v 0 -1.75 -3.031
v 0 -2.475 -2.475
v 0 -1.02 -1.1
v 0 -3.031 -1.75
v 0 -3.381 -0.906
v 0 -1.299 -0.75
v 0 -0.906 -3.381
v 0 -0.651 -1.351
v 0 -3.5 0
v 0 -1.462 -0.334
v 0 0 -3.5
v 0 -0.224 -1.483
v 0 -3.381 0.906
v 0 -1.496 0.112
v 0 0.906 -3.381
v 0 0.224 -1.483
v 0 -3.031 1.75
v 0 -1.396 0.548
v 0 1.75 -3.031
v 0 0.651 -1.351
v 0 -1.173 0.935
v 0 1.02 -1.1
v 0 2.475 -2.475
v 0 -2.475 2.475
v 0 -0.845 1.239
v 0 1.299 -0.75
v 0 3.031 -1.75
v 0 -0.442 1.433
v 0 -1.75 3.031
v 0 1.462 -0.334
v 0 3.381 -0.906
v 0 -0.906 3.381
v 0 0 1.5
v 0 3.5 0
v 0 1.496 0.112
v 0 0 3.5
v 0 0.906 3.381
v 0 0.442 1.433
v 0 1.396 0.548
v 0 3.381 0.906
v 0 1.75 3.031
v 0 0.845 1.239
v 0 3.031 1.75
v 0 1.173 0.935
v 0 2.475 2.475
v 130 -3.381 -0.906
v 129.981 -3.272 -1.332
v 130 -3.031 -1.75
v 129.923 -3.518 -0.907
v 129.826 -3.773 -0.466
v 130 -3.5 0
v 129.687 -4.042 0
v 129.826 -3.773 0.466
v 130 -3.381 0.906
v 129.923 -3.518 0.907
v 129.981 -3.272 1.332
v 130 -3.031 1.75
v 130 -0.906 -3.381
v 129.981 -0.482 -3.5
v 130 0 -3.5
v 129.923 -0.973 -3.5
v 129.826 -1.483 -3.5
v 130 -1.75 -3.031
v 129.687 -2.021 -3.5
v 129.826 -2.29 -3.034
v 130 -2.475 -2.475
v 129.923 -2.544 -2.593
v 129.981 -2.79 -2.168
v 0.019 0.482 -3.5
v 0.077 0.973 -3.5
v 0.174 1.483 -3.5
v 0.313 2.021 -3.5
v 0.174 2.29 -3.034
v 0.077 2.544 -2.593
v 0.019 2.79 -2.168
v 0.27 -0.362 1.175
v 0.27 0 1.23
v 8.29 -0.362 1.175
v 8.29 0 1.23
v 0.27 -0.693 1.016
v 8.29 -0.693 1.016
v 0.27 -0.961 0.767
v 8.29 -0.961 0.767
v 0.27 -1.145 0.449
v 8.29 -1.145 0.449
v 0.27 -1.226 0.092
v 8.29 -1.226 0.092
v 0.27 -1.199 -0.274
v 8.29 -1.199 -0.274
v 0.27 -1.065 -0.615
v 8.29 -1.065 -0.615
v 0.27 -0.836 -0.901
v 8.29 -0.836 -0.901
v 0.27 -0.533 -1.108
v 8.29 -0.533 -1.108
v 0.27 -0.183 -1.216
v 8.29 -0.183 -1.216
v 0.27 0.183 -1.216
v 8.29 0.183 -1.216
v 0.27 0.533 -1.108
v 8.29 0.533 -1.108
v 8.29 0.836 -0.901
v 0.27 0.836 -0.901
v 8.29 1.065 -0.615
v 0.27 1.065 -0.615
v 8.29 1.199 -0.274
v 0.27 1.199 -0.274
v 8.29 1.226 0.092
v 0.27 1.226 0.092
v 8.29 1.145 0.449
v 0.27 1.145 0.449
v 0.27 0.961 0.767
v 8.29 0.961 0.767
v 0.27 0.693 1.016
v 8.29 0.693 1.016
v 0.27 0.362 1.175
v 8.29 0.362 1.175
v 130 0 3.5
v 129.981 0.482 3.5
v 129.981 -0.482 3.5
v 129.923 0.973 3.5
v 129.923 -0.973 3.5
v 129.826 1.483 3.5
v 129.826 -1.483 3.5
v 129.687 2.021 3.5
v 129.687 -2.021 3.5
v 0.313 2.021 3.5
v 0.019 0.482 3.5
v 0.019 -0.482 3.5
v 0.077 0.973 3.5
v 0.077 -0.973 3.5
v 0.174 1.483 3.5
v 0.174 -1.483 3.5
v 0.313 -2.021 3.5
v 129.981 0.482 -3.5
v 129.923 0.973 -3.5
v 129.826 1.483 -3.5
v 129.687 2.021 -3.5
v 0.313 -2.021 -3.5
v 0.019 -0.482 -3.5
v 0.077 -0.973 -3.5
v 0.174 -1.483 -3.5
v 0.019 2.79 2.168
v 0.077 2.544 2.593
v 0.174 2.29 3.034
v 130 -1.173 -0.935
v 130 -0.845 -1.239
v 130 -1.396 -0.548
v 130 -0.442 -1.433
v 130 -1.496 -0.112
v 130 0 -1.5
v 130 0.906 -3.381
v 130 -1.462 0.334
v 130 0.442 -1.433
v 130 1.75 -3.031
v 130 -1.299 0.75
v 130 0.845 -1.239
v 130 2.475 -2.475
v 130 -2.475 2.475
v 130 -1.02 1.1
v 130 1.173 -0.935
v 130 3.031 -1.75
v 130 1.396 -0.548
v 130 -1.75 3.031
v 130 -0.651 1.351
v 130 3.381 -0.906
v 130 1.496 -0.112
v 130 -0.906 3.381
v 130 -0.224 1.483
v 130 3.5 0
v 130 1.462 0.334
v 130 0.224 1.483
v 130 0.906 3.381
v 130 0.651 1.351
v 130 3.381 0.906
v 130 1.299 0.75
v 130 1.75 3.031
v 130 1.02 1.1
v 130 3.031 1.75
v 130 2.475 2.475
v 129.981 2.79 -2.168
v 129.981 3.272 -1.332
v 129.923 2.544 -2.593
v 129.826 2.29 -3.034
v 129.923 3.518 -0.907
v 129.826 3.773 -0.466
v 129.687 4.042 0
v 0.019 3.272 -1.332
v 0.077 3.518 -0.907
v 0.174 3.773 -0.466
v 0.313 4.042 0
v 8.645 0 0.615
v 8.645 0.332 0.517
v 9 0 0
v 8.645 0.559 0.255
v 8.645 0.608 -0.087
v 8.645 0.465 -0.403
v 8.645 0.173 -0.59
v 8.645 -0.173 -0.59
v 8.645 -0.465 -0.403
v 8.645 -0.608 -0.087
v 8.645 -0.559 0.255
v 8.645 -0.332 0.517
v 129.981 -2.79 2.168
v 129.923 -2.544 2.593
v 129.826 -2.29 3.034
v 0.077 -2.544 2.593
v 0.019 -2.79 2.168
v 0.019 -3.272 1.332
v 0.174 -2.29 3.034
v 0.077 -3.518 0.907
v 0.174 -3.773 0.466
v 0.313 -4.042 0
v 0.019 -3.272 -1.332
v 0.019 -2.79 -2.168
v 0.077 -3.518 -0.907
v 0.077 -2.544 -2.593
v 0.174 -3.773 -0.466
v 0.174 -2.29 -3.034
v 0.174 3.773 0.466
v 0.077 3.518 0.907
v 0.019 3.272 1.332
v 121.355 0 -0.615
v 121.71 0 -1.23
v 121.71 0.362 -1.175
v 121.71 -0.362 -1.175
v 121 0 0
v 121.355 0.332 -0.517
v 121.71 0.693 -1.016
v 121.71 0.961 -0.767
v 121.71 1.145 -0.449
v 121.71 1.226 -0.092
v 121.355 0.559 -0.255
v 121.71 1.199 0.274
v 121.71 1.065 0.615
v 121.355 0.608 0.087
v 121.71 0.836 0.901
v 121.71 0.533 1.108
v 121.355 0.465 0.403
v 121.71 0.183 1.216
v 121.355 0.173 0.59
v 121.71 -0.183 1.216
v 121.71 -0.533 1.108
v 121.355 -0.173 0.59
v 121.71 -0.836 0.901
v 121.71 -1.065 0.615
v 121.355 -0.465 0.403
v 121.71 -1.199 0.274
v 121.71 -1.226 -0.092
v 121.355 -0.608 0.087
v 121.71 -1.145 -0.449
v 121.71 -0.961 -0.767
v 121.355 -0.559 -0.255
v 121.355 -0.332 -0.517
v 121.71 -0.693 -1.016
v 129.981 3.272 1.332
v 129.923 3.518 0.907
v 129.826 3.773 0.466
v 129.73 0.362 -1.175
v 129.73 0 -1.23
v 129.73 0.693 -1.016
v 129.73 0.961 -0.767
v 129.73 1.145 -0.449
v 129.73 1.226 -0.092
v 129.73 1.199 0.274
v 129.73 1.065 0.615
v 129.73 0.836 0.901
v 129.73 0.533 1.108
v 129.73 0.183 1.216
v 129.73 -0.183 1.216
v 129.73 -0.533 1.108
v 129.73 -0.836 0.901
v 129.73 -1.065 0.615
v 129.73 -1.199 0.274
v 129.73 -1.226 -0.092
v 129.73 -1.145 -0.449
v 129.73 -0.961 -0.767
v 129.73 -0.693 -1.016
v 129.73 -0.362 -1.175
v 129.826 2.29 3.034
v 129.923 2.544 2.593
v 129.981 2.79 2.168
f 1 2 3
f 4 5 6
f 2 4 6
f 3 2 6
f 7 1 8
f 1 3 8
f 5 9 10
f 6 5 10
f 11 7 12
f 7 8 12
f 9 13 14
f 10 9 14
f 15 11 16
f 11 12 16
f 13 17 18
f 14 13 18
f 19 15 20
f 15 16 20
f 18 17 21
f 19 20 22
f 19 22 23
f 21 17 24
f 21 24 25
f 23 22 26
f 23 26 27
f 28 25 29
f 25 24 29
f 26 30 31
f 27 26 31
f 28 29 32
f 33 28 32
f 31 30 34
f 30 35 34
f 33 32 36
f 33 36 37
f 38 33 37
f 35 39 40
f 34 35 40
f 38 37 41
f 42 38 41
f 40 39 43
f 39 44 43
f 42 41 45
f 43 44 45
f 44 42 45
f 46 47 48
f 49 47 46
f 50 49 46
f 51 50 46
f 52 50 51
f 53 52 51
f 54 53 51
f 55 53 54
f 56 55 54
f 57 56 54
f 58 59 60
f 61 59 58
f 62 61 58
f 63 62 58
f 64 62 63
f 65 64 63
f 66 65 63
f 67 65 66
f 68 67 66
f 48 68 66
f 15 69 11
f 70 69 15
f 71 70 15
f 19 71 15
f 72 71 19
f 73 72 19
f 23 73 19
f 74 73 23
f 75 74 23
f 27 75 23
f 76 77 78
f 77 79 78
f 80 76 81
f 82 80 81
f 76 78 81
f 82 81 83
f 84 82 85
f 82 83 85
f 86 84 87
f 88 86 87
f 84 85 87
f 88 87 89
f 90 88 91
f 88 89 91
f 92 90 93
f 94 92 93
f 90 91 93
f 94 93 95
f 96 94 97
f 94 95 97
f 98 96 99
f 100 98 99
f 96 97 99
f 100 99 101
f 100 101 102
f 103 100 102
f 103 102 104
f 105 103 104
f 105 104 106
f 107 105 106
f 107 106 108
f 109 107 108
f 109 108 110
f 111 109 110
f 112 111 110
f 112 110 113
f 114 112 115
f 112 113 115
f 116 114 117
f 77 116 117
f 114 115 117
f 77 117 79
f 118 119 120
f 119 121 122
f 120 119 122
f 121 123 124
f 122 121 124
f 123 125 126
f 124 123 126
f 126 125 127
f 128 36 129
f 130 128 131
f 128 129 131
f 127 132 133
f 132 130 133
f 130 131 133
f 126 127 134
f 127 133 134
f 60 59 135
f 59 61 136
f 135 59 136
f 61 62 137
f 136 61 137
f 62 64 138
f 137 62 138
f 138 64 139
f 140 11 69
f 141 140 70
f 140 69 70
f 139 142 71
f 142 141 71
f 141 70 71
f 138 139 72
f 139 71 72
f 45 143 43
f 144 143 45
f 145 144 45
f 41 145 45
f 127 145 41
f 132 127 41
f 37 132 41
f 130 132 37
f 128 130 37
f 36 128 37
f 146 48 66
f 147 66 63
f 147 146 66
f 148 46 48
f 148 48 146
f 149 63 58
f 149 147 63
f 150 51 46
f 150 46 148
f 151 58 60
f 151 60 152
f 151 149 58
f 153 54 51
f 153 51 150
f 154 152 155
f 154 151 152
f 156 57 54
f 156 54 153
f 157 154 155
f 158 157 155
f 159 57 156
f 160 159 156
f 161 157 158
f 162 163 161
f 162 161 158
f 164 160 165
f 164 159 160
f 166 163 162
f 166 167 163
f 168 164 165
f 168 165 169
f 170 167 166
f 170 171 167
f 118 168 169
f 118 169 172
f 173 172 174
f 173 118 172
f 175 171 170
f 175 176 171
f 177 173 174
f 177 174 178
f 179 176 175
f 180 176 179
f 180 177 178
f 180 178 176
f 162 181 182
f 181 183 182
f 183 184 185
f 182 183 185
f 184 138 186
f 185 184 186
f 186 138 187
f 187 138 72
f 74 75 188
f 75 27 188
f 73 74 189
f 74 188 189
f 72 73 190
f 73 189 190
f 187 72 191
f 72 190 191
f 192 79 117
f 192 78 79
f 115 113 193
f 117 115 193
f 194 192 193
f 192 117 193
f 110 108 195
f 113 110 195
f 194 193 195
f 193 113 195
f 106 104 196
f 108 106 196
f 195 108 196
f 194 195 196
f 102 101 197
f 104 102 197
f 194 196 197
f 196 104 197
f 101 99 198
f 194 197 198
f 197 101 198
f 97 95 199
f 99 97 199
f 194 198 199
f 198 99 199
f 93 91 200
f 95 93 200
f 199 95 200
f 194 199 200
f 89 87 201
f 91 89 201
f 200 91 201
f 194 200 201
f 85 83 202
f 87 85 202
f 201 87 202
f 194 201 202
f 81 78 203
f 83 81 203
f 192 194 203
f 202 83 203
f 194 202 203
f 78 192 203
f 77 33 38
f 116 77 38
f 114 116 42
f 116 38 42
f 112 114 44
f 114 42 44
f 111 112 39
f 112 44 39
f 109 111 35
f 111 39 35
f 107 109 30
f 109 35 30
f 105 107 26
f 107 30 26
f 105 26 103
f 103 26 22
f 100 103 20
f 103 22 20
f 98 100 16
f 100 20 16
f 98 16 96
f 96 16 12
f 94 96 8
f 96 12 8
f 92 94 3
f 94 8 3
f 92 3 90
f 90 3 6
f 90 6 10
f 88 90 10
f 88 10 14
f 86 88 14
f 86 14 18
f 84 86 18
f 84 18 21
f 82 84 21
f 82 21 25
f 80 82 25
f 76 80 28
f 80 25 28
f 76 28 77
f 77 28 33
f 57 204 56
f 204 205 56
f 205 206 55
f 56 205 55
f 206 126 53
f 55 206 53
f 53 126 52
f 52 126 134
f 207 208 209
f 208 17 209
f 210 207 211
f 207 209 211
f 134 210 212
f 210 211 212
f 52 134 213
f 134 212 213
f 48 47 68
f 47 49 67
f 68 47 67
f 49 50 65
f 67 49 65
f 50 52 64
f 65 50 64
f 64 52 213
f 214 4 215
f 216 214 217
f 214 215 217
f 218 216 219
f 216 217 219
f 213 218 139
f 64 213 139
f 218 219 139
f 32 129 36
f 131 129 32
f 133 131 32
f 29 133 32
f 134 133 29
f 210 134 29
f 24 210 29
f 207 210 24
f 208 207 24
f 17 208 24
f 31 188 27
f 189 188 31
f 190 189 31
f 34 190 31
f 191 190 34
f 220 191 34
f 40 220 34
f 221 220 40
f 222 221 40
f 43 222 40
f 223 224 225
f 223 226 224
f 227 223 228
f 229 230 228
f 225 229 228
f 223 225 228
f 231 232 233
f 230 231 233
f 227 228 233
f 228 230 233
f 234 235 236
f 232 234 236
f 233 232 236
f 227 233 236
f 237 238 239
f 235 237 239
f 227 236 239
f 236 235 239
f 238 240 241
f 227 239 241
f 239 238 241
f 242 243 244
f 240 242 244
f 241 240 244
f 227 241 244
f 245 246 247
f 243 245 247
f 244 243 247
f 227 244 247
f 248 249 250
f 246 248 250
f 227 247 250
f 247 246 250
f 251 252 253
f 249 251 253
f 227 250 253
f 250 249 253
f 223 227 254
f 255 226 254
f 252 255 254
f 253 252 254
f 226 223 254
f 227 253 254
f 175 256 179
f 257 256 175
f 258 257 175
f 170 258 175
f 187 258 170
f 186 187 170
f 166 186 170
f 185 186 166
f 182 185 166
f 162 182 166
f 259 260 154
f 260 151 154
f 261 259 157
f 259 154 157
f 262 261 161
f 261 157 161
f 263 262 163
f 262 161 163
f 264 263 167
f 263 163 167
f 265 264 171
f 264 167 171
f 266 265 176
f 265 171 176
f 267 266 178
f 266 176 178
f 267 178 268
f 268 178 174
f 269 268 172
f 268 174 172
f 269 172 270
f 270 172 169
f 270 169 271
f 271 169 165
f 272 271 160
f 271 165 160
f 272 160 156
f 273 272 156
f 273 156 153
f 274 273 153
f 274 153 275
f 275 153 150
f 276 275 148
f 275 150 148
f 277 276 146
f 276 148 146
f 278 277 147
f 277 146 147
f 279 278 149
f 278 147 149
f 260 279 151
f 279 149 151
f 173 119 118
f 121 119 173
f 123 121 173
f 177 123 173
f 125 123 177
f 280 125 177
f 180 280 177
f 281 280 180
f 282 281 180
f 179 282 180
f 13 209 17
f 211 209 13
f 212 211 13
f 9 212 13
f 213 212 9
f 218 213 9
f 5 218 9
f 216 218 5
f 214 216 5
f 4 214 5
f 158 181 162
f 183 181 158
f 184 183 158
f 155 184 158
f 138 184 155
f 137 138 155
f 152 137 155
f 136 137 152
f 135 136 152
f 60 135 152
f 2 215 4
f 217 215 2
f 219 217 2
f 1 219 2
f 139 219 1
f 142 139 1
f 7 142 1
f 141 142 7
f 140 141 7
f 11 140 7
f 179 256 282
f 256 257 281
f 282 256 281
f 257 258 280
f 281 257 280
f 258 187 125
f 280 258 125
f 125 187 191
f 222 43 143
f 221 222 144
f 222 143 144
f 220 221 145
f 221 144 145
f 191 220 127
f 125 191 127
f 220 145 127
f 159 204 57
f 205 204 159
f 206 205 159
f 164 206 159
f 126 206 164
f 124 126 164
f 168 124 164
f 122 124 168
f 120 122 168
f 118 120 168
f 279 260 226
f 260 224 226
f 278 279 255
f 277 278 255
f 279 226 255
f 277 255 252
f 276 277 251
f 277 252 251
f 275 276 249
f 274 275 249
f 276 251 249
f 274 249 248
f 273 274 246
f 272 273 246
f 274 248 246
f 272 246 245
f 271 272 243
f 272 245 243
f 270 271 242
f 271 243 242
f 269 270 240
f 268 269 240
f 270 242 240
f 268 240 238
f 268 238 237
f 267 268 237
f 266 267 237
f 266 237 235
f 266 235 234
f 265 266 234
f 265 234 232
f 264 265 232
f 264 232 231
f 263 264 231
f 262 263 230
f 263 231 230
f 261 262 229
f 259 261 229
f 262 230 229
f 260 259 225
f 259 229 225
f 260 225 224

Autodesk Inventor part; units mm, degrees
sketch "Sketch_1" plane through (0, 0, 0) normal (0, 0, 1) x (1, 0, 0)
  line L0 (130, 0) -> (0, 0)
  line L1 (0, 0) -> (0, 3.5)
  line L2 (0, 3.5) -> (0.6062, 4.55)
  line L3 (0.6062, 4.55) -> (129.3938, 4.55)
  line L4 (129.3938, 4.55) -> (130, 3.5)
  line L5 (130, 3.5) -> (130, 0)
  line L6 (130, 0) -> (0, 0)
revolve "Revolution1" add sketch "Sketch_1" angle 360 about axis through (130, 0, 0) along (1, 0, 0)
sketch "Sketch_2" plane through (0, 0, 0) normal (1, 0, 0) x (0, 1, 0)
  line L0 (7, 7) -> (-7, 7)
  line L1 (-7, 7) -> (-7, -7)
  line L2 (-7, -7) -> (7, -7)
  line L3 (7, -7) -> (7, 7)
  line L4 (-2.0207, 3.5) -> (-4.0415, 0)
  line L5 (-4.0415, 0) -> (-2.0207, -3.5)
  line L6 (-2.0207, -3.5) -> (2.0207, -3.5)
  line L7 (2.0207, -3.5) -> (4.0415, 0)
  line L8 (4.0415, 0) -> (2.0207, 3.5)
  line L9 (2.0207, 3.5) -> (-2.0207, 3.5)
extrude "Extrusion1" cut sketch "Sketch_2" along normal blind 130
sketch "Sketch3" plane through (0, 0, 0) normal (-1, 0, 0) x (0, 0, 1)
  point P0 (0, 0)
hole "Hole1" at (0, 0, 0) direction (1, 0, 0) diameter 2.459 depth 8.2901 tip angle 120 countersink diameter 3 countersink angle 90 thread size "M3x0.5" class "6H" standard "ISO Metric profile"
sketch "Sketch4" plane through (130, 0, 0) normal (1, 0, 0) x (0, 0, -1)
  point P0 (0, 0)
hole "Hole2" at (130, 0, 0) direction (-1, 0, 0) diameter 2.459 depth 8.2901 tip angle 120 countersink diameter 3 countersink angle 90 thread size "M3x0.5" class "6H" standard "ISO Metric profile"
ref_plane "C3_XY" through (130, 0, 0) normal (-1, 0, 0) x (0, 0, -1)
ref_plane "C3_YZ" through (130, 0, 0) normal (0, 0, -1) x (0, -1, 0)
ref_plane "C3_ZX" through (130, 0, 0) normal (0, -1, 0) x (-1, 0, 0)
properties part number "SLSBF7-130-M3-N3"
